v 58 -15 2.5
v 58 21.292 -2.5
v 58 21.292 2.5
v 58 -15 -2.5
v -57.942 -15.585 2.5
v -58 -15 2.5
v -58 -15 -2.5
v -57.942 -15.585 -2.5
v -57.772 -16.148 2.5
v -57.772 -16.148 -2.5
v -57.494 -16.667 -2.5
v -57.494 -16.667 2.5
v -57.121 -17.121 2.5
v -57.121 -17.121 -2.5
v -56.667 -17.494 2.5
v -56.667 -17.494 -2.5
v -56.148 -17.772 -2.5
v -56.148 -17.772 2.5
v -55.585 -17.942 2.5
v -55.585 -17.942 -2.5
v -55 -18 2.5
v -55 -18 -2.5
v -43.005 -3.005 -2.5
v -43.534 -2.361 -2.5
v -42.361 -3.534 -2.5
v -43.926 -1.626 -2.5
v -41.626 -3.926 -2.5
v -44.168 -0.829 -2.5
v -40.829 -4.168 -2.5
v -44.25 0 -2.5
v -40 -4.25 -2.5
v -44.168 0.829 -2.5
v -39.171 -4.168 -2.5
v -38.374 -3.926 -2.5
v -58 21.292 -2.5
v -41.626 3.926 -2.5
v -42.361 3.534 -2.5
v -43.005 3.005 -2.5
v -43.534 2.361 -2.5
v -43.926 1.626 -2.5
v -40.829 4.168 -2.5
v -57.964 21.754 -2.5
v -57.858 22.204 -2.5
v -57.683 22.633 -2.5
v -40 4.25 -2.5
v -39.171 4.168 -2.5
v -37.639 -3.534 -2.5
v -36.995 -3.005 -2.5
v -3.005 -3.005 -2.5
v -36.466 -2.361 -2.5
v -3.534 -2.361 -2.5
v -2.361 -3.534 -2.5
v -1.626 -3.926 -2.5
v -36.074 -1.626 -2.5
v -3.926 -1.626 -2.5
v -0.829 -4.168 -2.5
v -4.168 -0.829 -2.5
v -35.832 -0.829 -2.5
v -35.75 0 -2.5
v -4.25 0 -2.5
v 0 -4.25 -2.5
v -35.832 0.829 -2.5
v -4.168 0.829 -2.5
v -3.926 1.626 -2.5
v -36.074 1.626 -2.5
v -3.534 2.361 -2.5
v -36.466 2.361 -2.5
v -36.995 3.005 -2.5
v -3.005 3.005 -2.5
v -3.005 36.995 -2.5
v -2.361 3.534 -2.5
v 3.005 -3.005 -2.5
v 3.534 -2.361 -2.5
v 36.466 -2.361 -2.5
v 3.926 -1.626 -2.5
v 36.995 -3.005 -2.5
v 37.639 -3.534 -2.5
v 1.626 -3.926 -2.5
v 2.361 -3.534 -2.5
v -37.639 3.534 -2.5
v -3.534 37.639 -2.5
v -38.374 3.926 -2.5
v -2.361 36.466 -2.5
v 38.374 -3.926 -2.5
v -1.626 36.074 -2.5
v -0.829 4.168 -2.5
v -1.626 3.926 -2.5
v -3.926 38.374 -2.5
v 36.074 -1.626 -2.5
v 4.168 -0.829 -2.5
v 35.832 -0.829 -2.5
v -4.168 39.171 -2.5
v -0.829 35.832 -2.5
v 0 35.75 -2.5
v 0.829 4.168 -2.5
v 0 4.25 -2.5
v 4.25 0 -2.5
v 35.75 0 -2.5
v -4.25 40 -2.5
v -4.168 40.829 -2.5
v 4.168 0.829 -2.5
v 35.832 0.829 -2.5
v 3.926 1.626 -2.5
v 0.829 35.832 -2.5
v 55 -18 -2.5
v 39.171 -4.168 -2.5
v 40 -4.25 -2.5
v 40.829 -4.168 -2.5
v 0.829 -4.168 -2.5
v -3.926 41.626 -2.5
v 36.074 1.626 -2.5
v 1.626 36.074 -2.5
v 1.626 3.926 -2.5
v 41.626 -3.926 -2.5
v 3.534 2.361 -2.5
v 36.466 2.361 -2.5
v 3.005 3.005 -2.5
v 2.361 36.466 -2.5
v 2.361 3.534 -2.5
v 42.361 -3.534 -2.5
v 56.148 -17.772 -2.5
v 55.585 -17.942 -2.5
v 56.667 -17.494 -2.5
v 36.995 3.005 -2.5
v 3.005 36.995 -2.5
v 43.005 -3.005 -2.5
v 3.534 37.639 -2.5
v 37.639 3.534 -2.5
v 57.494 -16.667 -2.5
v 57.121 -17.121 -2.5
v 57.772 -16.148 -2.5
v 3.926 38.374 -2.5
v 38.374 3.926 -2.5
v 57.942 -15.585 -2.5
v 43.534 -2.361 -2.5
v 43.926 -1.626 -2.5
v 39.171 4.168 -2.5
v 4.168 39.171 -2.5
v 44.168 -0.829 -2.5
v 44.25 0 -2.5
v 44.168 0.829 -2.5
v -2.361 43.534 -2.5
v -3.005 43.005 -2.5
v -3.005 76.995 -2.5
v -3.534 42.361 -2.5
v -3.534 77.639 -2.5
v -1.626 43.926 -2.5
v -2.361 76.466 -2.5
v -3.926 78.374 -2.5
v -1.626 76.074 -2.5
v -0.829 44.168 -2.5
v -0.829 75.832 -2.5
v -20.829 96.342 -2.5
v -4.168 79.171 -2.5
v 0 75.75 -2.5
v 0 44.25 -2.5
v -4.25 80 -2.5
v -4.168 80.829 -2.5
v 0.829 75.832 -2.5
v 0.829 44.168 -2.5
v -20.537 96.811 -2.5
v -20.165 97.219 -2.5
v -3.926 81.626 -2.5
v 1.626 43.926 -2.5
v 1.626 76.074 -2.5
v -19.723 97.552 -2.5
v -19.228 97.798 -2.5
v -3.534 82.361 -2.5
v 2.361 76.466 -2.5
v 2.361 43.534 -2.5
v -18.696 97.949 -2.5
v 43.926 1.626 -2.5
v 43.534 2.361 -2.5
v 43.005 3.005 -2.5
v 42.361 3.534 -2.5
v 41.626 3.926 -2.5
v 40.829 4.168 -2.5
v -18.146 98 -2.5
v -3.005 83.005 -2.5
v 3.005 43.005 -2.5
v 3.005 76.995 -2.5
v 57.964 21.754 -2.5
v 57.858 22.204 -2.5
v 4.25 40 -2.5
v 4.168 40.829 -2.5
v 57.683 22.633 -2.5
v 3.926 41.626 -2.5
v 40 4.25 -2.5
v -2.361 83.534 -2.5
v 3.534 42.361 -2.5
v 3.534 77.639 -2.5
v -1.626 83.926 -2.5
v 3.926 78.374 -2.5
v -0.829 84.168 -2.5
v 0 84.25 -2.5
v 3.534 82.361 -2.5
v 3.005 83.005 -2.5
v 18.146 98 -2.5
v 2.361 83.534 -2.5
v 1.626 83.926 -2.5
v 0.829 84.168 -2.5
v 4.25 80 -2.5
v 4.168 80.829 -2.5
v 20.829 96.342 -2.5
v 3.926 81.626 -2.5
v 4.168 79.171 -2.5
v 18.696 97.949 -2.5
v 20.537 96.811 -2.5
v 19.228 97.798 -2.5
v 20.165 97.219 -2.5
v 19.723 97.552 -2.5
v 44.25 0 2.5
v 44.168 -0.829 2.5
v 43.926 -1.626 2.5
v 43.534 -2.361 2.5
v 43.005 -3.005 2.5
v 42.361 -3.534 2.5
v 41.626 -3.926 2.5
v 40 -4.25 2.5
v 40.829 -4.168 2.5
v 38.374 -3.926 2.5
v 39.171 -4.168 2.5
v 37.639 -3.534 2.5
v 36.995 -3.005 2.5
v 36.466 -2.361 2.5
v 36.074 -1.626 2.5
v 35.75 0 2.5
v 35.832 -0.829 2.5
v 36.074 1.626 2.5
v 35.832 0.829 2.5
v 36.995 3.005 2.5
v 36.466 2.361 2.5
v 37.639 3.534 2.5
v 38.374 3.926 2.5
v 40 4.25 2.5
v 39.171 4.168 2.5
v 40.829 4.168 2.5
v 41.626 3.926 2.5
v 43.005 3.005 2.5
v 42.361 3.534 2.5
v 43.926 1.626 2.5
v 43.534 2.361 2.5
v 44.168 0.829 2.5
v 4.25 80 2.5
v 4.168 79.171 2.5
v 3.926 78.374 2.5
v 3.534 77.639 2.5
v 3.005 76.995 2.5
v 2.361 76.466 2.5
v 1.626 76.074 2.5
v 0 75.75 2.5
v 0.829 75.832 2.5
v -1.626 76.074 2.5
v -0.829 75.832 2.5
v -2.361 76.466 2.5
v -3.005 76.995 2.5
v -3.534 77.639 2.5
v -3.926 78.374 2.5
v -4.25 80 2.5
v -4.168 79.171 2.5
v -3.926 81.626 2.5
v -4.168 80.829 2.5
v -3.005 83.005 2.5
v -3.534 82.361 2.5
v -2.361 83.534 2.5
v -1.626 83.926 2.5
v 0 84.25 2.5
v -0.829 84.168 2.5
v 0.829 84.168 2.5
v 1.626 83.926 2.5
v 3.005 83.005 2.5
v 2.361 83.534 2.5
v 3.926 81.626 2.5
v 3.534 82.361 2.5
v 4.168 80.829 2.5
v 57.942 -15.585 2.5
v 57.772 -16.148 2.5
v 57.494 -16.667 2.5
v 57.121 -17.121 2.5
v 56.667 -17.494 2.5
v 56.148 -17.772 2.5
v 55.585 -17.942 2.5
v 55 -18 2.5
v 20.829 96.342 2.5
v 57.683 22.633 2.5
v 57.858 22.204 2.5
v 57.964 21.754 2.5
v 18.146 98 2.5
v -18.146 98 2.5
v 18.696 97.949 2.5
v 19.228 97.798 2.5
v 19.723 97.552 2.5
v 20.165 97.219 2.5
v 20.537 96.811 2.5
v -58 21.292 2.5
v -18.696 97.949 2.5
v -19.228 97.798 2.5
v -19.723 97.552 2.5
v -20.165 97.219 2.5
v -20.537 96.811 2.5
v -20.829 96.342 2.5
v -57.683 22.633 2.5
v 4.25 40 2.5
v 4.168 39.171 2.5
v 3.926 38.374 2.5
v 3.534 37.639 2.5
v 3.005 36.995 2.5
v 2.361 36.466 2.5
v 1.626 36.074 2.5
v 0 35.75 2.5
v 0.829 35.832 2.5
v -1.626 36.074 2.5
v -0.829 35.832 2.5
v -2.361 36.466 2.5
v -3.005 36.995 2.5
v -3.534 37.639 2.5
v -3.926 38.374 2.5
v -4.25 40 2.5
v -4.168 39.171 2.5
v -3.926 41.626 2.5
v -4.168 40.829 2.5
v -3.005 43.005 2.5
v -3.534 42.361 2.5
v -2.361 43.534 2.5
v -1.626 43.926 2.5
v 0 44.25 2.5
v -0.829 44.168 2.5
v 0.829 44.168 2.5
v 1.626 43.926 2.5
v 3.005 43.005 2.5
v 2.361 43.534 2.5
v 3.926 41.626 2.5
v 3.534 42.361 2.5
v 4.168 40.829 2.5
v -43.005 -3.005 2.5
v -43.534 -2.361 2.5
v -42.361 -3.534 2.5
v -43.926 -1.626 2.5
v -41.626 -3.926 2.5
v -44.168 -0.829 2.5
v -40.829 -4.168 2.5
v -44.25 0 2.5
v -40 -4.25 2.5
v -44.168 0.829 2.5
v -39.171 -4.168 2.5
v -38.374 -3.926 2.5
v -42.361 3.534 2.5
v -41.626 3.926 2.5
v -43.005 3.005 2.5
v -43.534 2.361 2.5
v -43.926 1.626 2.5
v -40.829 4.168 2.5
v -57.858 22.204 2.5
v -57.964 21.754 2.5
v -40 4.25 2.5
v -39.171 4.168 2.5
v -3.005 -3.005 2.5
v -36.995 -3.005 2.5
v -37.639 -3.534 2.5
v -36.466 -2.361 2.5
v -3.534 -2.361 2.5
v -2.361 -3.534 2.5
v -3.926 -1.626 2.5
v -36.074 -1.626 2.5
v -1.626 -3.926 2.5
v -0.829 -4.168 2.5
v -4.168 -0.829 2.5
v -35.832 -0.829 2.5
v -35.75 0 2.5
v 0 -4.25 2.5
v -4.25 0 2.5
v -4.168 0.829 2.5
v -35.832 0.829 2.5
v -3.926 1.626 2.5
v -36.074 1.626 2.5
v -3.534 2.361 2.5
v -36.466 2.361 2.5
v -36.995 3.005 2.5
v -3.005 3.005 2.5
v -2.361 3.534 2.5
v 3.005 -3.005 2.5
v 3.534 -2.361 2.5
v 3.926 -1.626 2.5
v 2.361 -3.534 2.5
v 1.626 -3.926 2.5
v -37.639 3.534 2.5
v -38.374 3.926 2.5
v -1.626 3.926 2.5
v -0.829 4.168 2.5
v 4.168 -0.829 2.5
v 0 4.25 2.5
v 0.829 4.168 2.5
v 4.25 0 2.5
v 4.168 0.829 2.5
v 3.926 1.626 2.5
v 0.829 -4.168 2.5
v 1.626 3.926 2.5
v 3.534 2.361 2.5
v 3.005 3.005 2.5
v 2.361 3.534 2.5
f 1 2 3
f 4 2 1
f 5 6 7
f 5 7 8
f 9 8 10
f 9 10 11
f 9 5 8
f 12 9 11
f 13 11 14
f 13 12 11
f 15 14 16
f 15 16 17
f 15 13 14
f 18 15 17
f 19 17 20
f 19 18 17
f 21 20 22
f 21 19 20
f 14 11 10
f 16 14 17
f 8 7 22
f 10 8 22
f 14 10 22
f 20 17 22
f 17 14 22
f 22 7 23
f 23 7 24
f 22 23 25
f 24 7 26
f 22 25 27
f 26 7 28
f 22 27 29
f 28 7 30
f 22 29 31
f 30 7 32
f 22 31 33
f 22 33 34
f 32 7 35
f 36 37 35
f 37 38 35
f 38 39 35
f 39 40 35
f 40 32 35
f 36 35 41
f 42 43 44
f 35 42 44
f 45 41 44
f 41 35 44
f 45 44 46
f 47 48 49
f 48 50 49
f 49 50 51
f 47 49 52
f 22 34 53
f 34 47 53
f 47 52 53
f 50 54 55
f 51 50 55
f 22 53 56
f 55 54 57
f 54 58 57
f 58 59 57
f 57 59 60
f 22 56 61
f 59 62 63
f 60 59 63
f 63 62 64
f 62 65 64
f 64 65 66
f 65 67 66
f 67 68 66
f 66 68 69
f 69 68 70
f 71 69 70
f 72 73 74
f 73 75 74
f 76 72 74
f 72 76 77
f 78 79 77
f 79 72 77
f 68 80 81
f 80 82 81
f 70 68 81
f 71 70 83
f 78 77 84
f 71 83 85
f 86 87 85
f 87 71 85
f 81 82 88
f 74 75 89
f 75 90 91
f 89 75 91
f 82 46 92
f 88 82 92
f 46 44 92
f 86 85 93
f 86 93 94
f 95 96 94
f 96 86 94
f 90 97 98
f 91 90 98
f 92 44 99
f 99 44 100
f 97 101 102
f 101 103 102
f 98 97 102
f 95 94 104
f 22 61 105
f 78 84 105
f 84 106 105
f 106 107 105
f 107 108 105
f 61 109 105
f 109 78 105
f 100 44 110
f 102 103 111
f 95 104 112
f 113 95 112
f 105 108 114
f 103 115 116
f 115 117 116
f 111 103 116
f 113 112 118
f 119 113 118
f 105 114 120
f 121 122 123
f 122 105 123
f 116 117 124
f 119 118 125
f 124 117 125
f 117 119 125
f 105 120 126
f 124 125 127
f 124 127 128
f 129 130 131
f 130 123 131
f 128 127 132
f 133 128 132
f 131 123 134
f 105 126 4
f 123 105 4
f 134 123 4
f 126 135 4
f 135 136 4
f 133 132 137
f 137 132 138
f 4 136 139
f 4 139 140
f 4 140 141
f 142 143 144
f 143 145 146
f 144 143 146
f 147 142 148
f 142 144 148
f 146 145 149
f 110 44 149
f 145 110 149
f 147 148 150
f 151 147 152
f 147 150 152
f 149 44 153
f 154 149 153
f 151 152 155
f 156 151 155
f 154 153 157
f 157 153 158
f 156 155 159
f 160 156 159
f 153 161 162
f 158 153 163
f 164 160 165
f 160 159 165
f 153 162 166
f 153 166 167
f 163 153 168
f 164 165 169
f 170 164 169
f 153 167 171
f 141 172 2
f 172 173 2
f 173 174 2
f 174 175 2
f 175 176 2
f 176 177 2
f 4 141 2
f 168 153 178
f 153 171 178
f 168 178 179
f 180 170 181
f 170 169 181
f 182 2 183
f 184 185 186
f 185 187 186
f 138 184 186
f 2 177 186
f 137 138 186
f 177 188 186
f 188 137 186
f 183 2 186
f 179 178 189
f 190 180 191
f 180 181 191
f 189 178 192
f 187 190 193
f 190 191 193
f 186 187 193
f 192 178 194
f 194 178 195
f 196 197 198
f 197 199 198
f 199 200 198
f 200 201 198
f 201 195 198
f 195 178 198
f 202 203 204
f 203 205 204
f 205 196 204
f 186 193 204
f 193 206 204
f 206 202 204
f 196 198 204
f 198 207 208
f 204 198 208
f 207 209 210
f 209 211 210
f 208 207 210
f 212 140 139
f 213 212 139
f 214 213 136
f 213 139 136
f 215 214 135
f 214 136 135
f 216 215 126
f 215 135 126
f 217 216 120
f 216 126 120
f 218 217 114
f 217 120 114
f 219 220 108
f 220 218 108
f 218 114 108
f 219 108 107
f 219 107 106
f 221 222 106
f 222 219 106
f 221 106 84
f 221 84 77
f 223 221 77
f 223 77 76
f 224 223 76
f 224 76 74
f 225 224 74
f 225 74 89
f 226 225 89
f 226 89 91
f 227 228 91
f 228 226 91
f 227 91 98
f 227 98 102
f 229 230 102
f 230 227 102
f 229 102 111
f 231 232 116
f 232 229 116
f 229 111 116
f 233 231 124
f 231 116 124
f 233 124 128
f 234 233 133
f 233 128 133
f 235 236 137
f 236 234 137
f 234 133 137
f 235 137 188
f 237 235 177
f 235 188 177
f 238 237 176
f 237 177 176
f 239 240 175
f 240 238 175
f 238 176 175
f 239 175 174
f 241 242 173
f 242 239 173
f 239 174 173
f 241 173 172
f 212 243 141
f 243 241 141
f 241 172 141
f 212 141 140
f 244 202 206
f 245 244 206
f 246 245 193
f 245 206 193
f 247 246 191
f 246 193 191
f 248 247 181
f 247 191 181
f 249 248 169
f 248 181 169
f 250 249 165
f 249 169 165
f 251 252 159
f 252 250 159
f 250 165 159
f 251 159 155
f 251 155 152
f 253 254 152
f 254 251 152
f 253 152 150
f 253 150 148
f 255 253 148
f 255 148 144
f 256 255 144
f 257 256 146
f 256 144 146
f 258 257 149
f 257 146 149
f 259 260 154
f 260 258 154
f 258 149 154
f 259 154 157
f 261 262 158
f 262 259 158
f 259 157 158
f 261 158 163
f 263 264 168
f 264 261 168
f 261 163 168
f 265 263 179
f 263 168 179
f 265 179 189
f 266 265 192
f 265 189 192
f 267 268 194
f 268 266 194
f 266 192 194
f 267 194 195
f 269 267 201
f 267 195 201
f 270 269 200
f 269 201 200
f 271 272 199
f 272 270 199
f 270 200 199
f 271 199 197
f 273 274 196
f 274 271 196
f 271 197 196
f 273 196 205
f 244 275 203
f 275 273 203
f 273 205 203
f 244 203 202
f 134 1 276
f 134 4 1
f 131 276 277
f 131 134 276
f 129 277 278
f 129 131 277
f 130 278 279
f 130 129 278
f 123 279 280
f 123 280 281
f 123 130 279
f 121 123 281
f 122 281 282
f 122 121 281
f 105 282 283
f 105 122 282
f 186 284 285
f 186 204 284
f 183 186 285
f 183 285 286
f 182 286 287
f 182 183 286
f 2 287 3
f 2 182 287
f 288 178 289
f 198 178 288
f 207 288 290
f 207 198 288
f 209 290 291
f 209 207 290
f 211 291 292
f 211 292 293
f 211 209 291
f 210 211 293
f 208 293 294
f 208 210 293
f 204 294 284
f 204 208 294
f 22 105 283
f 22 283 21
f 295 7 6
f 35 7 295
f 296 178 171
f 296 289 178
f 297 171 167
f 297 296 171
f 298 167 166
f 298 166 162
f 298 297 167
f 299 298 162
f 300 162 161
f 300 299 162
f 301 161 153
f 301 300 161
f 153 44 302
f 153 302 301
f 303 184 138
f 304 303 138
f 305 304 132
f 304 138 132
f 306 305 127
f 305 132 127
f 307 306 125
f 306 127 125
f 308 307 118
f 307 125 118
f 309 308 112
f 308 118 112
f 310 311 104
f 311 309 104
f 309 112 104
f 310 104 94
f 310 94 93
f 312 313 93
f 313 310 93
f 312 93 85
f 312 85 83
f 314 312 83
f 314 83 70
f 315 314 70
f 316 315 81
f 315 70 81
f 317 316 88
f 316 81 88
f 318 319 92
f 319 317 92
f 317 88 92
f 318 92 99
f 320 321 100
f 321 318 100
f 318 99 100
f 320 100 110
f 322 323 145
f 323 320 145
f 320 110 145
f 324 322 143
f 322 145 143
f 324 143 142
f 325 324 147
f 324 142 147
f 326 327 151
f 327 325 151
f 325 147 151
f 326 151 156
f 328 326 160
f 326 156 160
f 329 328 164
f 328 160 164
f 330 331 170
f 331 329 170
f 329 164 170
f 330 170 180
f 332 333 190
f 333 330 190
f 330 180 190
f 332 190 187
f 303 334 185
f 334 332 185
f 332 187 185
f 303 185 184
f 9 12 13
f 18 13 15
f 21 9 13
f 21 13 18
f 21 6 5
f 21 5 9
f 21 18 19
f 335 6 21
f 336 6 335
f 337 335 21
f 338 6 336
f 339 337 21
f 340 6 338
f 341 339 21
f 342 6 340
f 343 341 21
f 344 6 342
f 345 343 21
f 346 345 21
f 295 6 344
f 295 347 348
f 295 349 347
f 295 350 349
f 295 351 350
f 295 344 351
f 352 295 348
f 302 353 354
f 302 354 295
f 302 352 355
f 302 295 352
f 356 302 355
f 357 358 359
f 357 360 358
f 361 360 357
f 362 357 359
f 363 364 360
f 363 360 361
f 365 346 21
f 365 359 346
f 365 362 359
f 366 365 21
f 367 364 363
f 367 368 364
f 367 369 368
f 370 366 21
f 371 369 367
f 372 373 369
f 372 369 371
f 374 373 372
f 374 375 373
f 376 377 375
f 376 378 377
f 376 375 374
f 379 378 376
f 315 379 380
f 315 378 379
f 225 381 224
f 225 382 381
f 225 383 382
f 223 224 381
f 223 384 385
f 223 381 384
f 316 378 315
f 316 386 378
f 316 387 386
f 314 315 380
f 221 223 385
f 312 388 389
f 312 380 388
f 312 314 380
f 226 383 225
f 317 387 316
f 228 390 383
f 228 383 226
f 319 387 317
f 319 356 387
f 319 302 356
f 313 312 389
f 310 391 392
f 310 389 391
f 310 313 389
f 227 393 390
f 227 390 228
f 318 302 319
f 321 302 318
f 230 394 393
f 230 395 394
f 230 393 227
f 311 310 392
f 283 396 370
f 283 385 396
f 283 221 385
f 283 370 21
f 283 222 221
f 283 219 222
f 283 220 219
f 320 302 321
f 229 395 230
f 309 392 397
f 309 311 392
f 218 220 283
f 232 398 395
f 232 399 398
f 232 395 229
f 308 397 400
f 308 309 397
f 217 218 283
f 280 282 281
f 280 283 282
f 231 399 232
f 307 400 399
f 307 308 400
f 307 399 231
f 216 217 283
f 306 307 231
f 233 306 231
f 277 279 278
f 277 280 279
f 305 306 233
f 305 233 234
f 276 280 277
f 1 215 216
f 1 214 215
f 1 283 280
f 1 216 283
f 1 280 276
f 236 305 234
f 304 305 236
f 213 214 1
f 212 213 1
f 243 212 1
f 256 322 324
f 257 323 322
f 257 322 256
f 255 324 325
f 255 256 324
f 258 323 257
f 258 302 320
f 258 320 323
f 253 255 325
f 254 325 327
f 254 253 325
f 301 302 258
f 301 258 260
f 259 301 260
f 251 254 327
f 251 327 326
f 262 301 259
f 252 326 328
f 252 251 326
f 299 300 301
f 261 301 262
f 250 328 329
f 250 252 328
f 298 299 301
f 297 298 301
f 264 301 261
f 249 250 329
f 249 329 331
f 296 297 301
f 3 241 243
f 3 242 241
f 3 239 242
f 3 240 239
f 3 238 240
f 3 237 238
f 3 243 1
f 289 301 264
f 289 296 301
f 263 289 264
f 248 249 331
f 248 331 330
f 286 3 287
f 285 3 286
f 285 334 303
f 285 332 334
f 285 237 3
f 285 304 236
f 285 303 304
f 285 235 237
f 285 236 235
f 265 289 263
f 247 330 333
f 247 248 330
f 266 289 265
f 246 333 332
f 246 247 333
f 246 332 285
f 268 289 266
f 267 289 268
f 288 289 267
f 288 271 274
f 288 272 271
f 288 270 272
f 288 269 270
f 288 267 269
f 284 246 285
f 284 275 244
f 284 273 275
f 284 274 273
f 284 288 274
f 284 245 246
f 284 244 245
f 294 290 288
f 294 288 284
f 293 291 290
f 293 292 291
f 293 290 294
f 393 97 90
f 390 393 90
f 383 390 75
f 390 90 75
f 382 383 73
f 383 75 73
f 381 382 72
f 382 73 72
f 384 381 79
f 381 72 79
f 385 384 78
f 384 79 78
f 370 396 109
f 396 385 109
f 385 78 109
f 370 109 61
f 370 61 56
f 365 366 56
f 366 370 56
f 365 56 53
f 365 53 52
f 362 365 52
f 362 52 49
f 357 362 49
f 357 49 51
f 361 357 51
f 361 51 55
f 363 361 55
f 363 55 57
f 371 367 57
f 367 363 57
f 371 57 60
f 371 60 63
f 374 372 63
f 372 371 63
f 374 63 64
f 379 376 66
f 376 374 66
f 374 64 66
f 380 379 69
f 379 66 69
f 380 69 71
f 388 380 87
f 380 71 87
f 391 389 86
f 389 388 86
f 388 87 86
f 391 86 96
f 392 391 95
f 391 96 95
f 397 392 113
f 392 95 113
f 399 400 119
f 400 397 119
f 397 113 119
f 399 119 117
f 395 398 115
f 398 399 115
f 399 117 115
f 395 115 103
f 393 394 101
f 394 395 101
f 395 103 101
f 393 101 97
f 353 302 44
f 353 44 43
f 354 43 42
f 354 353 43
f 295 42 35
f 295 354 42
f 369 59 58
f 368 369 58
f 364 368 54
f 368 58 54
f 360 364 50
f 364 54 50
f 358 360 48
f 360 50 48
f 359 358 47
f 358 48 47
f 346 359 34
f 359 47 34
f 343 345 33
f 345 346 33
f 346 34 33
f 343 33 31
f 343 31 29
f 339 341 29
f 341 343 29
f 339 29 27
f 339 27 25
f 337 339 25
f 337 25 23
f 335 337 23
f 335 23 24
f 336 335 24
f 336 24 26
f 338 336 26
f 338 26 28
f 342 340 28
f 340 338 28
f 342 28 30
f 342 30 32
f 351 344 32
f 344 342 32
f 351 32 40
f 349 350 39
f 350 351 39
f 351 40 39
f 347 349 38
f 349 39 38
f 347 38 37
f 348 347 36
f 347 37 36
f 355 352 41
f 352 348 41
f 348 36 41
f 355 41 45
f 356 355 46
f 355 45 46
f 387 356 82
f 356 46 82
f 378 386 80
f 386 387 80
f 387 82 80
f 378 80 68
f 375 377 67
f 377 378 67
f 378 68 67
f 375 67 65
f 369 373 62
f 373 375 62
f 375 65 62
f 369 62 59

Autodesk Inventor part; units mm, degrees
ref_plane "YZ Plane" through (0, 0, 0) normal (1, 0, 0) x (0, 1, 0)
ref_plane "XZ Plane" through (0, 0, 0) normal (0, 1, 0) x (-1, 0, 0)
ref_plane "XY Plane" through (0, 0, 0) normal (0, 0, 1) x (1, 0, 0)
sketch "Sketch1" plane through (0, 0, 0) normal (0, 0, 1) x (1, 0, 0)
  circle A0 centre (0, 0) radius 4.25
  circle A1 centre (-40, 0) radius 4.25
  circle A2 centre (40, 0) radius 4.25
  circle A3 centre (0, 80) radius 4.25
  circle A4 centre (0, 40) radius 4.25
  line L0 (0, 0) -> (0, 80) construction
  line L1 (-40, 0) -> (40, 0) construction
  line L2 (-58, 98) -> (58, 98)
  line L3 (58, 98) -> (58, -18)
  line L4 (58, -18) -> (-58, -18)
  line L5 (-58, -18) -> (-58, 98)
  line L6 (-58, 98) -> (58, -18) construction
  line L7 (58, 98) -> (-58, -18) construction
  line L8 (-58, 22) -> (-20, 98)
  line L9 (20, 98) -> (58, 22)
  dimension "d0" = 8.5
  dimension "d1" = 8.5
  dimension "d2" = 8.5
  dimension "d3" = 8.5
  dimension "d4" = 8.5
  dimension "d5" = 80
  dimension "d6" = 80
  dimension "d7" = 116
  dimension "d8" = 116
  dimension "d9" = 40
  dimension "d10" = 40
  dimension "d11" = 40
extrude "Extrusion1" add sketch "Sketch1" along normal mid plane 5 contours L2 L9 L3 L4 L5 L8
fillet "Fillet1" radius 3 6 edges at (-58, -18, 0) (-58, 22, 0) (20, 98, 0) (-20, 98, 0) (58, 22, 0) (58, -18, 0)
equation "\"d1\" = d0"
equation "\"d2\" = d0"
equation "\"d3\" = d0"
equation "\"d4\" = d0"
properties part number "Connection_plate_T_120x120" material "Aluminum 6061"
